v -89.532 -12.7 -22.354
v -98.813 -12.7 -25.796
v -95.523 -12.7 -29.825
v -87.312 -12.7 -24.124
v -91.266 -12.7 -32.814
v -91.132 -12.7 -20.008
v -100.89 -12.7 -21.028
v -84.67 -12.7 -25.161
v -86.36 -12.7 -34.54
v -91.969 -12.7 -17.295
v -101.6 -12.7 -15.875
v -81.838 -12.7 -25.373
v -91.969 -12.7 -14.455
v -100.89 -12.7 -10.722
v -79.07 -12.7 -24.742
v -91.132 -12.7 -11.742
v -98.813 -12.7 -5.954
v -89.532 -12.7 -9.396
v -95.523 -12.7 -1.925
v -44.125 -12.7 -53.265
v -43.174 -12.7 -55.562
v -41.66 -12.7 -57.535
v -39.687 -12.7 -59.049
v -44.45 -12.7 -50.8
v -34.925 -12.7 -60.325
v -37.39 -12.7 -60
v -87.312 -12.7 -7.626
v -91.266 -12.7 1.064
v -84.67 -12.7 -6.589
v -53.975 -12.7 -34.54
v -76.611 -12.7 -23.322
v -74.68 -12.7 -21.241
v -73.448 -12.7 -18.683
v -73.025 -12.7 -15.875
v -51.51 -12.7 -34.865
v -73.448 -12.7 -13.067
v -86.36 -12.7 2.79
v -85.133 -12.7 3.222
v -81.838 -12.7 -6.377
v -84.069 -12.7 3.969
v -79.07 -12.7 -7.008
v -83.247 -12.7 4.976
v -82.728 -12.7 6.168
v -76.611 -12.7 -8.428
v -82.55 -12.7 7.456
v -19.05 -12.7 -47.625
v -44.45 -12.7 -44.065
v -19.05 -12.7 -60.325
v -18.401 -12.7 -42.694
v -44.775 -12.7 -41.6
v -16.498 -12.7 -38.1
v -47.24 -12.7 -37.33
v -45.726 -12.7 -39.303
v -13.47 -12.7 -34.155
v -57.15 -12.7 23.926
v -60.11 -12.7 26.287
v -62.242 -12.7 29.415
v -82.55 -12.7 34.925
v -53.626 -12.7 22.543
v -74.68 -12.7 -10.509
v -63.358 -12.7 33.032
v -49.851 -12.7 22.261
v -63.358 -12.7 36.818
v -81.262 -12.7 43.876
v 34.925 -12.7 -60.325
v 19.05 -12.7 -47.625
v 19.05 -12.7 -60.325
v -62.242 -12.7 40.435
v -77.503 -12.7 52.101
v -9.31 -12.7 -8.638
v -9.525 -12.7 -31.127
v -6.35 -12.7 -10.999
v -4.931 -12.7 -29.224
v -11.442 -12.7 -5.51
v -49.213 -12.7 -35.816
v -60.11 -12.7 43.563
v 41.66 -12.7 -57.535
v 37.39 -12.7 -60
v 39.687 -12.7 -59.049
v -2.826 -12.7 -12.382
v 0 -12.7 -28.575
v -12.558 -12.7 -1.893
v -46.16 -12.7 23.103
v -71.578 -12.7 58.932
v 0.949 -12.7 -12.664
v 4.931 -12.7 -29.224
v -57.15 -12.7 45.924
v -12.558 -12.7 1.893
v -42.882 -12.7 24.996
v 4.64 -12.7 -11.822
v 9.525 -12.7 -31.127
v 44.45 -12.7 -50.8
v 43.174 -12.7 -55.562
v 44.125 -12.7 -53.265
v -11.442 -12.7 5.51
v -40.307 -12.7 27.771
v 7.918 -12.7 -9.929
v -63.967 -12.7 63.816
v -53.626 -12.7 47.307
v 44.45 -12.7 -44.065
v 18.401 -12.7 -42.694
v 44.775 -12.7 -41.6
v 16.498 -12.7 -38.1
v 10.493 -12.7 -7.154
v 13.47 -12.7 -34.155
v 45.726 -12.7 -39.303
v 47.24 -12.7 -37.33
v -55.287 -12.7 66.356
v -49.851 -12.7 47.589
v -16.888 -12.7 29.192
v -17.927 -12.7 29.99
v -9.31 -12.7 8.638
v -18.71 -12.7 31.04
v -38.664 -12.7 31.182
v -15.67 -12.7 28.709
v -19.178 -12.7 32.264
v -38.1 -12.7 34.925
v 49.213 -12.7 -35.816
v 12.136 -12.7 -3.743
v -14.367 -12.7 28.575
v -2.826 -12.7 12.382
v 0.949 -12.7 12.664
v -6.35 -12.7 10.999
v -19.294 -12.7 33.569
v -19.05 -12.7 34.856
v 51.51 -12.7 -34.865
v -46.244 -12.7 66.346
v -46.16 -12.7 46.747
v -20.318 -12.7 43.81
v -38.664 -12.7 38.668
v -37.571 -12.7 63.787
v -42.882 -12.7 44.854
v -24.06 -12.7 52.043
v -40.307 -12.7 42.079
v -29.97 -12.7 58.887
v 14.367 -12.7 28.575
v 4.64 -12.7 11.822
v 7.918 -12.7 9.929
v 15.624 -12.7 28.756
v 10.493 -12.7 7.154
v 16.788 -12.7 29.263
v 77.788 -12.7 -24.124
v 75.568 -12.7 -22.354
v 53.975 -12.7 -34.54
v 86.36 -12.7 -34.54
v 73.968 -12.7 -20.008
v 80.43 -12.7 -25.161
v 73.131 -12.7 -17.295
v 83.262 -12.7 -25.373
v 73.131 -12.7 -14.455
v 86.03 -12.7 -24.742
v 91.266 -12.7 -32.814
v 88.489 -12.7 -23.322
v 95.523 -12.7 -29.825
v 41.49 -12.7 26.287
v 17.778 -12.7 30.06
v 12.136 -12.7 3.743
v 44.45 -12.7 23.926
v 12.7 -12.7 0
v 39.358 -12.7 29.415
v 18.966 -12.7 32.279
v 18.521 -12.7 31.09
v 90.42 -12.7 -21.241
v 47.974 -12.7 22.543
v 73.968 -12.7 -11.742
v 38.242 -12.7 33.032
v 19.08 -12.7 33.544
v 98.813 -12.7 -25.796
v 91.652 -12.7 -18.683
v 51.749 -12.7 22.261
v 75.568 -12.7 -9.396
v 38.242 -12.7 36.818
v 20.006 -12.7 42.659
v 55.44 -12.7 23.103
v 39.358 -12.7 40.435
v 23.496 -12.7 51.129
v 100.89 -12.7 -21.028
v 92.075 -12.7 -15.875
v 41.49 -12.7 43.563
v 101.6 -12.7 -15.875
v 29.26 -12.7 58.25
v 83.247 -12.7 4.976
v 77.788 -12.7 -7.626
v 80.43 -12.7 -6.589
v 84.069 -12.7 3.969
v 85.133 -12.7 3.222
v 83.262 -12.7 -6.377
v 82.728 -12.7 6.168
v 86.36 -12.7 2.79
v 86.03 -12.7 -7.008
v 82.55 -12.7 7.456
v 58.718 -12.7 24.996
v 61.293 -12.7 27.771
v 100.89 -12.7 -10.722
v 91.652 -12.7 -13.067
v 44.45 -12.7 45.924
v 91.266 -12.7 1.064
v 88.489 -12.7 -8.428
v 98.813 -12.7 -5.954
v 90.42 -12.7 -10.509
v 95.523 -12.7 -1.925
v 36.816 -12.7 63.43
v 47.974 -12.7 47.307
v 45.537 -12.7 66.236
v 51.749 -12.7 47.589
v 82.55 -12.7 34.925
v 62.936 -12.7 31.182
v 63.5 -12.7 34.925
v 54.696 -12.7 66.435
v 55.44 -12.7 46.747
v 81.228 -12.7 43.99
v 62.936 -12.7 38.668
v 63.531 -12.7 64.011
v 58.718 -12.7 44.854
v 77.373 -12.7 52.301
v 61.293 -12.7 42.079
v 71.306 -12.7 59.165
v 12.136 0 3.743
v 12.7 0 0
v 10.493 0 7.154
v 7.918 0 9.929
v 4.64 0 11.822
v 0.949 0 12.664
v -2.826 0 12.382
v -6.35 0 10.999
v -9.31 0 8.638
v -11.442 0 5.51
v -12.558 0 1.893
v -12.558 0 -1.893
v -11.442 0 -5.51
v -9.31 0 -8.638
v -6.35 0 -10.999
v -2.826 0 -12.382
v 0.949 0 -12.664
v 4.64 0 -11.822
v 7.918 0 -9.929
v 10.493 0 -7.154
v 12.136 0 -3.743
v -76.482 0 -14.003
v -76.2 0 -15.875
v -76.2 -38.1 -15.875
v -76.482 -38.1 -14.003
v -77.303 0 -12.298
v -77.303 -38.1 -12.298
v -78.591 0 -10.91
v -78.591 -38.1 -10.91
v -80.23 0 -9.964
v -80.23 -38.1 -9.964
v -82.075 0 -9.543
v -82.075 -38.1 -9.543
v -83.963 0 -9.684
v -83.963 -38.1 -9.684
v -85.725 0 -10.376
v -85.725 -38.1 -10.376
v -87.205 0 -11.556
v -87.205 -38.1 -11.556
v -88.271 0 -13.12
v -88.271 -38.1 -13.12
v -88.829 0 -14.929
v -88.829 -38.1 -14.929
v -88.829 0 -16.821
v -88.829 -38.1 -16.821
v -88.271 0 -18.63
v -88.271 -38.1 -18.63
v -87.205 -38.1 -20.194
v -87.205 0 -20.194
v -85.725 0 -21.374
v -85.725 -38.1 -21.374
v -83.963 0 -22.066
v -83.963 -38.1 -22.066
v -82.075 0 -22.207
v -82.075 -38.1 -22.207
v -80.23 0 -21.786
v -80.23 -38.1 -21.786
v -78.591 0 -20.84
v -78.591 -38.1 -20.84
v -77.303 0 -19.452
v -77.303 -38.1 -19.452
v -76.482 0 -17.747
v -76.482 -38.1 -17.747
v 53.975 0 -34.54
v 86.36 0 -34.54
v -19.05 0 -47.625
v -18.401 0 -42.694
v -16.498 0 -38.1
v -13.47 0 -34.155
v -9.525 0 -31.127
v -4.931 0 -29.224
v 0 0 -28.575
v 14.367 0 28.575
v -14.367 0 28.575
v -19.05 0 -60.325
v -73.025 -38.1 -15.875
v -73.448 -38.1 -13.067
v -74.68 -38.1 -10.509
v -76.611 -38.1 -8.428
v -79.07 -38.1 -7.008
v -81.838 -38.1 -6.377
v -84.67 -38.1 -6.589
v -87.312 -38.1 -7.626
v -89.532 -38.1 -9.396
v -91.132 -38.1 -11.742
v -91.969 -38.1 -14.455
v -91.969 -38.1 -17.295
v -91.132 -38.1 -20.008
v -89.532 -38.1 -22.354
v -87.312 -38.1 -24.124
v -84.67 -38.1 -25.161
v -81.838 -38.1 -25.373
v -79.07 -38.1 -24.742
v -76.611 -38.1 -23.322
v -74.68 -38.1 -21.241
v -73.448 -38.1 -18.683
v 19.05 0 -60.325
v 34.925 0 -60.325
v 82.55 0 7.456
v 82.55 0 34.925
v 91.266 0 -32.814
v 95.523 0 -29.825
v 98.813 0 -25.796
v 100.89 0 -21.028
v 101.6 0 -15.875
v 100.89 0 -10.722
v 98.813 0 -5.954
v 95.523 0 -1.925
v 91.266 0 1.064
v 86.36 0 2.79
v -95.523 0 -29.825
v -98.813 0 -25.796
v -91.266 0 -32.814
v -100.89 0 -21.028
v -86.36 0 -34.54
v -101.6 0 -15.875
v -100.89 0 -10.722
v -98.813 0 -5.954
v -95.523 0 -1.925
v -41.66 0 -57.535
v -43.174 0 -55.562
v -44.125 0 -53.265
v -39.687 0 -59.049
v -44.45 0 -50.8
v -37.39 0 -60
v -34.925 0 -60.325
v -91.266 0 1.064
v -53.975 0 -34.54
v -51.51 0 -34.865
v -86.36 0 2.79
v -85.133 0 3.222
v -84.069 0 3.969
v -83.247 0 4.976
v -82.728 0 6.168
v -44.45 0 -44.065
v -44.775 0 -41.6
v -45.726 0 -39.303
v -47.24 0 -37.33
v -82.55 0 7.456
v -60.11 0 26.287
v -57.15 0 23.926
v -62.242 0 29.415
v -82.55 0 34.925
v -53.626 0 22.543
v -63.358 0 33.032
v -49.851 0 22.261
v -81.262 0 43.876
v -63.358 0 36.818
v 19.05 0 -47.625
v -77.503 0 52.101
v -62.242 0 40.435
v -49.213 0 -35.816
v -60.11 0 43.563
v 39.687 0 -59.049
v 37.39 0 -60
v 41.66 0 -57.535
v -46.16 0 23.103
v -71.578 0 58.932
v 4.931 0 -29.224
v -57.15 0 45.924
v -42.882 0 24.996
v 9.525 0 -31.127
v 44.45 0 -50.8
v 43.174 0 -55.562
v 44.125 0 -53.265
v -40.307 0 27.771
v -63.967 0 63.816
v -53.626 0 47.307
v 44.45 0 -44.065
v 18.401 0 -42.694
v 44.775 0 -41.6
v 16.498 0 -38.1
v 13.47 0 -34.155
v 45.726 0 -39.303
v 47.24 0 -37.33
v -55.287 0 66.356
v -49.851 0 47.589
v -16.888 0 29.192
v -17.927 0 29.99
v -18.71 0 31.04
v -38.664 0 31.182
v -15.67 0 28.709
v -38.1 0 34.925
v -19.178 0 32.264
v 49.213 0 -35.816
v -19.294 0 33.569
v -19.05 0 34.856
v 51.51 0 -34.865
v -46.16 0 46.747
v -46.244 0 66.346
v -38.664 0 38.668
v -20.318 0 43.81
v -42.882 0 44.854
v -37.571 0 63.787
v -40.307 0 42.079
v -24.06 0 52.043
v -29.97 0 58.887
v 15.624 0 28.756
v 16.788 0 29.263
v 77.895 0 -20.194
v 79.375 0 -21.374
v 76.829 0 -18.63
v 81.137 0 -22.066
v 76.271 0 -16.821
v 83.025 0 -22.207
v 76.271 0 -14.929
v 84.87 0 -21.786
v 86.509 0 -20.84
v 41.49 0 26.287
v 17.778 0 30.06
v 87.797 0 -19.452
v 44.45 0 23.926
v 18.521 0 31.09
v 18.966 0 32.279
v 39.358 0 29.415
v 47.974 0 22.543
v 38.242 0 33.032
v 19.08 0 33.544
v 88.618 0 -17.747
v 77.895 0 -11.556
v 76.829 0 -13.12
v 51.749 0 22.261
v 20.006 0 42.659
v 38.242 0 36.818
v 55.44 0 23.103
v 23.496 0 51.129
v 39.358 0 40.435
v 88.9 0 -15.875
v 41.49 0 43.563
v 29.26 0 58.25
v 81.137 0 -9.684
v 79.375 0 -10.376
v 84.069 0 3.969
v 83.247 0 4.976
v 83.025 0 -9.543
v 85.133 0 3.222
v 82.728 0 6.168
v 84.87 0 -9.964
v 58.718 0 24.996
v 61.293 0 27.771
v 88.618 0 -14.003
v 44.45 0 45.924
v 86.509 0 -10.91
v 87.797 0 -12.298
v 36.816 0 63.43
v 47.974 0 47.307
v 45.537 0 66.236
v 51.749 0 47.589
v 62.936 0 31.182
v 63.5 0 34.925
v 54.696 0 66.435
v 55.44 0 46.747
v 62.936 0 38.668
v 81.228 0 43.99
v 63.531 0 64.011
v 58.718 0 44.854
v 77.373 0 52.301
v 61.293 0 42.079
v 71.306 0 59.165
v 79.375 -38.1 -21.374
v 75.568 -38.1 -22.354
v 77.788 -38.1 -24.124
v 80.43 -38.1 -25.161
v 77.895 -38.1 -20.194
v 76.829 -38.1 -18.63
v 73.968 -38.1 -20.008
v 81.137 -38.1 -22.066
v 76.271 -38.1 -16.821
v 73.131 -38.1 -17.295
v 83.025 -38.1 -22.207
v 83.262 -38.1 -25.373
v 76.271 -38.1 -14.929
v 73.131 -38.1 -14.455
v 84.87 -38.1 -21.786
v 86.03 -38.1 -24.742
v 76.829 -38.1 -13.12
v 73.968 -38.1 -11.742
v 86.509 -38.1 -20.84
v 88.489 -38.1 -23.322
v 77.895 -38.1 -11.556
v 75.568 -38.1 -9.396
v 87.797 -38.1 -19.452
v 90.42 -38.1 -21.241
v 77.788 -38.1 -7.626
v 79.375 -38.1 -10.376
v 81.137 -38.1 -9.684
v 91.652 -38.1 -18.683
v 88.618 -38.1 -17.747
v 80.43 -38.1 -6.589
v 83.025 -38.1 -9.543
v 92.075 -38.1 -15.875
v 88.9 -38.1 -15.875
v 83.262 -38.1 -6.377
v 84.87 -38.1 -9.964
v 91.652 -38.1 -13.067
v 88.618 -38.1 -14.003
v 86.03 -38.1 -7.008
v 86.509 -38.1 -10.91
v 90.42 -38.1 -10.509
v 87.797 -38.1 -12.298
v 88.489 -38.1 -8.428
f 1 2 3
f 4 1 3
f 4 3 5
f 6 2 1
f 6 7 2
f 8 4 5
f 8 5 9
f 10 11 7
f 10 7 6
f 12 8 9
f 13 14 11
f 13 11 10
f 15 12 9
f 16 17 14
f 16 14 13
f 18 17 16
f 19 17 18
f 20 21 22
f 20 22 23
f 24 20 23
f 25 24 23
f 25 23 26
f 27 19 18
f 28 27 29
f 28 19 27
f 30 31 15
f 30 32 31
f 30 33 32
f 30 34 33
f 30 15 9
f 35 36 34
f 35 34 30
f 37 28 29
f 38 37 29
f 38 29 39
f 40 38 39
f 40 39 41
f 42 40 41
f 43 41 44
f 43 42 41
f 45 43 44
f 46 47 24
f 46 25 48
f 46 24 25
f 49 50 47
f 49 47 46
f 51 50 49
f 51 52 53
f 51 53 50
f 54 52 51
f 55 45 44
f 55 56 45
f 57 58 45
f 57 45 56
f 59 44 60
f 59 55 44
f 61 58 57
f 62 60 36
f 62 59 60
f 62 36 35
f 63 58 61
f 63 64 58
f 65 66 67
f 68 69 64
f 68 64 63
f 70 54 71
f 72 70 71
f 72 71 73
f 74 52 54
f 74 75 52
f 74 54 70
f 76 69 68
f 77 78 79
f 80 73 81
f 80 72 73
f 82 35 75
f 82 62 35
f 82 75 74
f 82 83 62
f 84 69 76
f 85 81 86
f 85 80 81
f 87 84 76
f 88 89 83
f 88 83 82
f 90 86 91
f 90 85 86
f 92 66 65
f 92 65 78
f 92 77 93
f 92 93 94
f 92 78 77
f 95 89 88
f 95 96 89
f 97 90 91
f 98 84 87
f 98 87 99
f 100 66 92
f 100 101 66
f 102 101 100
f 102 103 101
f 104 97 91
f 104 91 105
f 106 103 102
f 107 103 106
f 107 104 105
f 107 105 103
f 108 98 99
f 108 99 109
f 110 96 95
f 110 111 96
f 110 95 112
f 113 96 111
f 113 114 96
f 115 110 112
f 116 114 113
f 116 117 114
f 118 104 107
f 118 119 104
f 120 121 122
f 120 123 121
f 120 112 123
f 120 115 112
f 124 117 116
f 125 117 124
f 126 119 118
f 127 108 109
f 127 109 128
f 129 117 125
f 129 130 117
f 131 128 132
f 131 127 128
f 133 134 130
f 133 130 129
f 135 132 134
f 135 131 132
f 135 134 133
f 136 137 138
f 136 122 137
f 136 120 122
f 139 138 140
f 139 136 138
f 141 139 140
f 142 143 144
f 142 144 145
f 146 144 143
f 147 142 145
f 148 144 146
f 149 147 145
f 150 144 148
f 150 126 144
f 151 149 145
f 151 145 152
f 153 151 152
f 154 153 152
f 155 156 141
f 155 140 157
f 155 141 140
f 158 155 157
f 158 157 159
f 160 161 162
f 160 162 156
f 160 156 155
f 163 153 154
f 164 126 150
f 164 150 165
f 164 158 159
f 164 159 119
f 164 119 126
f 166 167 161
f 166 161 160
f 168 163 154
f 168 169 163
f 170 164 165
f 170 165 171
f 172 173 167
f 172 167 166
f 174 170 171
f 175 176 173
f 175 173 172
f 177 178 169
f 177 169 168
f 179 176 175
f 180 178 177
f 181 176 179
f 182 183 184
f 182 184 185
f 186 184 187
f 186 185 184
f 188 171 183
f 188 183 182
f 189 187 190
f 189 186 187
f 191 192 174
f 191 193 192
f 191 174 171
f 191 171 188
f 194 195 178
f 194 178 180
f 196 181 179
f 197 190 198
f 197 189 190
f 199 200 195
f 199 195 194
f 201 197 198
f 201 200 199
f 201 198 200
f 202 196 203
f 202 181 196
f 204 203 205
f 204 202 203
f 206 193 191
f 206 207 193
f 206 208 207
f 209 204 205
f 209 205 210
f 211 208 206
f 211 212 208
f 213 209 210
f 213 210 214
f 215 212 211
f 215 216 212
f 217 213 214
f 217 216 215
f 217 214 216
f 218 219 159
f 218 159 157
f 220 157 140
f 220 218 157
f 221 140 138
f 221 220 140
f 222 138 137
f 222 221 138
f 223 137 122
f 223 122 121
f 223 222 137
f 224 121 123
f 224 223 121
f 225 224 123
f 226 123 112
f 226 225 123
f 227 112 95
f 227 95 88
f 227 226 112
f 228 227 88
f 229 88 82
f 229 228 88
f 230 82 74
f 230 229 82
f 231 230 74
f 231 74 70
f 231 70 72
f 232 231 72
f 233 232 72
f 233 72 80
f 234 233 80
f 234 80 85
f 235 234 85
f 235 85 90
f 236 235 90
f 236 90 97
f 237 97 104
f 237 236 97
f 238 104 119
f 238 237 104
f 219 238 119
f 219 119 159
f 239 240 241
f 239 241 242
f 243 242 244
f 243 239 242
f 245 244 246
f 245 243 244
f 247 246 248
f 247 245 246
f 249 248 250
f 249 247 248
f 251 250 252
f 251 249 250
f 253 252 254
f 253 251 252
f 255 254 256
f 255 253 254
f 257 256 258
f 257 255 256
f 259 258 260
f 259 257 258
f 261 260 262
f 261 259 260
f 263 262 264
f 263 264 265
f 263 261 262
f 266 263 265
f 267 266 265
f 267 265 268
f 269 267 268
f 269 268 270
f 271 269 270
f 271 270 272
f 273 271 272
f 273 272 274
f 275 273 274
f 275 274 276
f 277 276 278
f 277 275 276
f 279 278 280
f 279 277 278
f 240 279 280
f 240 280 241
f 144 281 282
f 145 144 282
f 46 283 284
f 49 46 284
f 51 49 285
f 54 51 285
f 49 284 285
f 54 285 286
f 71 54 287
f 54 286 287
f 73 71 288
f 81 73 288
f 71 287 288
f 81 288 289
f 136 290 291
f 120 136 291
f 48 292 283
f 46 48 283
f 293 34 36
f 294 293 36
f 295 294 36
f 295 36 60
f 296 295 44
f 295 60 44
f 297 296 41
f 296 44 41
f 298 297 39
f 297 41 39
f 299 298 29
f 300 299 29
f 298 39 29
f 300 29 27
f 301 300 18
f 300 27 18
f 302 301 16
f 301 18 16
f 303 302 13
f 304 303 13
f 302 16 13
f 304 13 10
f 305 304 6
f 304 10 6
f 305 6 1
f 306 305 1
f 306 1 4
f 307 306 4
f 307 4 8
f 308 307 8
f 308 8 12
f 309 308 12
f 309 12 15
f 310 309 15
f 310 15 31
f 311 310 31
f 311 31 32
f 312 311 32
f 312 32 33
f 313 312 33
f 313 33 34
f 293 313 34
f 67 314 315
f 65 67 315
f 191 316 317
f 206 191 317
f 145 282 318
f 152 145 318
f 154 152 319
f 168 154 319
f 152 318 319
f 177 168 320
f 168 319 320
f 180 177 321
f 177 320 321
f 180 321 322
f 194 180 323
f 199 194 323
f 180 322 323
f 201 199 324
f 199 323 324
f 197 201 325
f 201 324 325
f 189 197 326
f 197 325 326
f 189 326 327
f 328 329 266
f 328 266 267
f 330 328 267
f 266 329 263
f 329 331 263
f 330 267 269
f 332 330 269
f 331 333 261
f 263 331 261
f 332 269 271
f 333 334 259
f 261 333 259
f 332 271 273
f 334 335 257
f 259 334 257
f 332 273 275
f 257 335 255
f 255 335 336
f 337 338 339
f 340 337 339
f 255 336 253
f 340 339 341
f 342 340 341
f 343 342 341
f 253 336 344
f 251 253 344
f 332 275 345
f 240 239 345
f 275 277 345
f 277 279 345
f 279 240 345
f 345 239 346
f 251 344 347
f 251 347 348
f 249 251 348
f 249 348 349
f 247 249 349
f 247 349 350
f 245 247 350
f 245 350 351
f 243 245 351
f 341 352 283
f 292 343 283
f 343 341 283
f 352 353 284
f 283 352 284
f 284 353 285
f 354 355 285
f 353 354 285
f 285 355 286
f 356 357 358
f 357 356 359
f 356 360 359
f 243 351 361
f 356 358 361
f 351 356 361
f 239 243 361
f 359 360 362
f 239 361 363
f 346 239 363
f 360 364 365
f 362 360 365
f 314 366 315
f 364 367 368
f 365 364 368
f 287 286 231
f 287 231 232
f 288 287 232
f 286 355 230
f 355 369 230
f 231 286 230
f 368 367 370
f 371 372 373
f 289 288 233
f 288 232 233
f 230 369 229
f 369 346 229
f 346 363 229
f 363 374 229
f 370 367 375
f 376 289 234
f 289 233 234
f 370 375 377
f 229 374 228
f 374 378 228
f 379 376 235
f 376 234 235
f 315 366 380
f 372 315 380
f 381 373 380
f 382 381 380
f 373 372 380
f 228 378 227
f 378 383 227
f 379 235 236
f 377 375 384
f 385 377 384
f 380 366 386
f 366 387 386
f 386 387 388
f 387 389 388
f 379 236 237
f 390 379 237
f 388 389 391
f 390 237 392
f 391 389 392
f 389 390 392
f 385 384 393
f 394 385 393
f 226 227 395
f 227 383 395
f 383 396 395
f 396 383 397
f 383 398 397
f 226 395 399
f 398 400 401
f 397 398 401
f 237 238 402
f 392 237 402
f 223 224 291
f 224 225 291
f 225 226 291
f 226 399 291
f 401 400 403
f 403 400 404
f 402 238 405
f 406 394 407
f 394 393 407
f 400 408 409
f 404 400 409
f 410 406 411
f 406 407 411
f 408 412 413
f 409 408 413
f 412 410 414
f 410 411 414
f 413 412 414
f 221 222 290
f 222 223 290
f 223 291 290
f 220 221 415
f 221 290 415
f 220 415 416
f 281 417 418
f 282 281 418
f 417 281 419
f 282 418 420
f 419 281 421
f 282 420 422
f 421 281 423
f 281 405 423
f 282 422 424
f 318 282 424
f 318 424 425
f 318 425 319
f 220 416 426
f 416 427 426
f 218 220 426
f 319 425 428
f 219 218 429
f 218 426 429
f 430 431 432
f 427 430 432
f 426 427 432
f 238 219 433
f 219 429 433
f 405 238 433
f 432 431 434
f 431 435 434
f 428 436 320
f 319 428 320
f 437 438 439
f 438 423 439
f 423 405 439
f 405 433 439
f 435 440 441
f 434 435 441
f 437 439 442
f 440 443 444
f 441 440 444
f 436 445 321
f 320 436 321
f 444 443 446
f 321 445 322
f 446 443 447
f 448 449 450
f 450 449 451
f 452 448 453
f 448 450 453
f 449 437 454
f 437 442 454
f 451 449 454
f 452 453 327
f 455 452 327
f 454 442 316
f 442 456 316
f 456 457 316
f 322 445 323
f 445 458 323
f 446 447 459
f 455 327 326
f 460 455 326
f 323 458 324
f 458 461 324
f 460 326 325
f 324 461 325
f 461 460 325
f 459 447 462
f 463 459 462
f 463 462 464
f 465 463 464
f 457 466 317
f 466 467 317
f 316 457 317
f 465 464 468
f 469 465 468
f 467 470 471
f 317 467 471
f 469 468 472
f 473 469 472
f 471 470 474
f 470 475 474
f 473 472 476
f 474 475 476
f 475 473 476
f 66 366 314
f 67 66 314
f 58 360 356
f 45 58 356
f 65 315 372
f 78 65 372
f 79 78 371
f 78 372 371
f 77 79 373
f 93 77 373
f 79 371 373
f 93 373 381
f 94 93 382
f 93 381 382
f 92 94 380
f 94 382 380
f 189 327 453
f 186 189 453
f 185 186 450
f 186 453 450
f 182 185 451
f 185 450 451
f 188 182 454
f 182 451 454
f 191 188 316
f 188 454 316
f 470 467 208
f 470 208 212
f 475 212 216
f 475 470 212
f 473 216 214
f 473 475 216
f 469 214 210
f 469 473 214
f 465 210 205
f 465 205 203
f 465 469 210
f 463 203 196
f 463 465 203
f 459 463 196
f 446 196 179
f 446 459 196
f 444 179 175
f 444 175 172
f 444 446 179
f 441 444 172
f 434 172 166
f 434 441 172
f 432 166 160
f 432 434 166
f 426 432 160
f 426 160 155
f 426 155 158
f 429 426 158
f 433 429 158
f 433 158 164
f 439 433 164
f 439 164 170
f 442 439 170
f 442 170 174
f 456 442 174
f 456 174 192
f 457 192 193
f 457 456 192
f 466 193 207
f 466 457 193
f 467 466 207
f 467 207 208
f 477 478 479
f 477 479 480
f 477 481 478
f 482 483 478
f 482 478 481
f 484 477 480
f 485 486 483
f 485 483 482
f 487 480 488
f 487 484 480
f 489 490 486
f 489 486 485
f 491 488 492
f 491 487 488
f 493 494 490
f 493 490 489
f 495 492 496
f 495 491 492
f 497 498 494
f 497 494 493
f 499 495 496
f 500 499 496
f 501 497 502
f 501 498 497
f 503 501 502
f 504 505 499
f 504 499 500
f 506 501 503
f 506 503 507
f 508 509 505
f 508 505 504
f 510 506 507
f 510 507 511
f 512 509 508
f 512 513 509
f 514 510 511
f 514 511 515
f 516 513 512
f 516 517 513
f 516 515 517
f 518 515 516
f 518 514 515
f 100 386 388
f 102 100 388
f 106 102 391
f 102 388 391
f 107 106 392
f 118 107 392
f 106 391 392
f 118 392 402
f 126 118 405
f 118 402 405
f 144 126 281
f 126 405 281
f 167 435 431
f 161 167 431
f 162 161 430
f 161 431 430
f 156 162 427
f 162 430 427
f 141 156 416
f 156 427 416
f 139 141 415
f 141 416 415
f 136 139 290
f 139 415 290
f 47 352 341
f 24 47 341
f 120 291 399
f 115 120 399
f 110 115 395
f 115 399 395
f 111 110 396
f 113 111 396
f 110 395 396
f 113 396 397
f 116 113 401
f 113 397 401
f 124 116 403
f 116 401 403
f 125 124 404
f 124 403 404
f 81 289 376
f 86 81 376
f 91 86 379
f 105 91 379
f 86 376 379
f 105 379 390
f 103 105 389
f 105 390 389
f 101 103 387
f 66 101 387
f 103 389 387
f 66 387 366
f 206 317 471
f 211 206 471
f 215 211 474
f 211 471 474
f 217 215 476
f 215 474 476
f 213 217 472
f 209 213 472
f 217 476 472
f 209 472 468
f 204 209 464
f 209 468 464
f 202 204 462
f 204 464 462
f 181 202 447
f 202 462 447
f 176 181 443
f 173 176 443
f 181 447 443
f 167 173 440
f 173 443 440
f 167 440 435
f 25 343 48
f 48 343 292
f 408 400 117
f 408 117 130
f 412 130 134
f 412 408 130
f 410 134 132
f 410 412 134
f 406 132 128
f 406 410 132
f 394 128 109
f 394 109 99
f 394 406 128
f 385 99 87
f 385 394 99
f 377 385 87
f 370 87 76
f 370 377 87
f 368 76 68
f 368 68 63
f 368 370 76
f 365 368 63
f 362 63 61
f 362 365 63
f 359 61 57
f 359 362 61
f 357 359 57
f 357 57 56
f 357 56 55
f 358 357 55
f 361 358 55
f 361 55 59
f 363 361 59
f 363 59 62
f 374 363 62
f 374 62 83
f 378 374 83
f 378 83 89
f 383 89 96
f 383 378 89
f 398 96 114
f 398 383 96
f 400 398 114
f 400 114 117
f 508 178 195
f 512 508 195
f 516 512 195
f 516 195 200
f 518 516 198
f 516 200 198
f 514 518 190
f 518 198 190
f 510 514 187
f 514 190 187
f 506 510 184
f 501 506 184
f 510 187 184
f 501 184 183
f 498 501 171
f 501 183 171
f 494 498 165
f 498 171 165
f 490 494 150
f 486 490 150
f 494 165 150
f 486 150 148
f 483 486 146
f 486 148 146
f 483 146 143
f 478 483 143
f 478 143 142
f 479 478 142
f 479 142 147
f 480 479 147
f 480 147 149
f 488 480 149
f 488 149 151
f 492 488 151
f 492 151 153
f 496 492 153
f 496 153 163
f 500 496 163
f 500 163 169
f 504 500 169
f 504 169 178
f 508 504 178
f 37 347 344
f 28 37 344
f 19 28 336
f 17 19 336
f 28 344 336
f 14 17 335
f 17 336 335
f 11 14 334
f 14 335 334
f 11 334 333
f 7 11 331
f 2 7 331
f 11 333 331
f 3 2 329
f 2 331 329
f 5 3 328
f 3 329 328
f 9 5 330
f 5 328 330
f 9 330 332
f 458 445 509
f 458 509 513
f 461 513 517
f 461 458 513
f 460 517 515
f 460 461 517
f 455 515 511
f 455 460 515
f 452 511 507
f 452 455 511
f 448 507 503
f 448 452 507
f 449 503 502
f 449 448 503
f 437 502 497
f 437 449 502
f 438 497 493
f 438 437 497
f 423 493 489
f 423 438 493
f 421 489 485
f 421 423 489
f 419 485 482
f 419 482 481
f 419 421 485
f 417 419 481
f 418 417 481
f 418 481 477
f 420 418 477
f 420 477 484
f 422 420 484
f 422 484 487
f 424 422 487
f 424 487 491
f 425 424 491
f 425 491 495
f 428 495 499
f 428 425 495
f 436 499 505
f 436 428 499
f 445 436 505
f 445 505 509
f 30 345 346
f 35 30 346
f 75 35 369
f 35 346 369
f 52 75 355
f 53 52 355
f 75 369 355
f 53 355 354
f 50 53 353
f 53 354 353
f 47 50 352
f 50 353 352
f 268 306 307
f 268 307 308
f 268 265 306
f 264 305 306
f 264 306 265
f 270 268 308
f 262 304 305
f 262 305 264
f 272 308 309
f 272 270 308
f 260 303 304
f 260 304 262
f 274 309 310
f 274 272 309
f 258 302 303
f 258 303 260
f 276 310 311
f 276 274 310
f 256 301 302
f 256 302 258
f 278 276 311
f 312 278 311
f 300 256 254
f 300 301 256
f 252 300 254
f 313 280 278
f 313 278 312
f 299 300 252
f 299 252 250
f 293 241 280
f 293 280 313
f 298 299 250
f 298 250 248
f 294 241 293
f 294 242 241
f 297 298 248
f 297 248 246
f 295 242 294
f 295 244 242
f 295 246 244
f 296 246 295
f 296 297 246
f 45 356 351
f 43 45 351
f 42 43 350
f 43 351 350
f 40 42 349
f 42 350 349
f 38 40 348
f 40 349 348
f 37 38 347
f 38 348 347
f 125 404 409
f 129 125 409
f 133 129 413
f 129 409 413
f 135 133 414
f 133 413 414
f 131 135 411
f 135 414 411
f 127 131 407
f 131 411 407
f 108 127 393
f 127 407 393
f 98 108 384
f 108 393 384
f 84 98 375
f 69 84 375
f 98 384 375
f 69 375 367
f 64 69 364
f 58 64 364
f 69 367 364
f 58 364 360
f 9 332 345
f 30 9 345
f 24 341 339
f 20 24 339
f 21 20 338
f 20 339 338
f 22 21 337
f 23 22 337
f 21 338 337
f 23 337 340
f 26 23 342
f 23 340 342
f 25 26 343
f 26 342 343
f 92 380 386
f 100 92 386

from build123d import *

# Parameters (mm, degrees)
F0_R     = 9.525
F0_R_2   = 12.7
F1_DEPTH = 12.7
F0_R_3   = 6.35
F2_DEPTH = 38.1


with BuildPart() as f1:
    # F0 (on Front) → F1 (new body)
    with BuildSketch(Plane.XZ):
        with BuildLine():
            ThreePointArc((19.0800315969, 33.5443825636), (17.7775003101, 30.0599167658), (14.3667655142, 28.575))
            Line((14.3667655142, 28.575), (-14.3667655142, 28.575))
            ThreePointArc((-14.3667655142, 28.575), (-18.3550358696, 30.4875726696), (-19.0500754755, 34.8557707639))
            ThreePointArc((-19.0500754755, 34.8557707639), (-50.7653853614, 66.6749811311), (-82.55, 34.925))
            Line((-82.55, 34.925), (-82.55, 7.4563898))
            ThreePointArc((-82.55, 7.4563898), (-83.6234833627, 4.4443203287), (-86.36, 2.79011184))
            ThreePointArc((-86.36, 2.79011184), (-101.6, -15.875), (-86.36, -34.54011184))
            Line((-86.36, -34.54011184), (-53.975, -34.54011184))
            ThreePointArc((-53.975, -34.54011184), (-47.2398079092, -37.3299197492), (-44.45, -44.06511184))
            Line((-44.45, -44.06511184), (-44.45, -50.8))
            ThreePointArc((-44.45, -50.8), (-41.6601920908, -57.5351920908), (-34.925, -60.325))
            Line((-34.925, -60.325), (-19.05, -60.325))
            Line((-19.05, -60.325), (-19.05, -47.625))
            ThreePointArc((-19.05, -47.625), (-13.4703841816, -34.1546158184), (0, -28.575))
            ThreePointArc((0, -28.575), (13.4703841816, -34.1546158184), (19.05, -47.625))
            Line((19.05, -47.625), (19.05, -60.325))
            Line((19.05, -60.325), (34.925, -60.325))
            ThreePointArc((34.925, -60.325), (41.6601920908, -57.5351920908), (44.45, -50.8))
            Line((44.45, -50.8), (44.45, -44.06511184))
            ThreePointArc((44.45, -44.06511184), (47.2398079092, -37.3299197492), (53.975, -34.54011184))
            Line((53.975, -34.54011184), (86.36, -34.54011184))
            ThreePointArc((86.36, -34.54011184), (101.6, -15.875), (86.36, 2.79011184))
            ThreePointArc((86.36, 2.79011184), (83.6234833627, 4.4443203287), (82.55, 7.4563898))
            Line((82.55, 7.4563898), (82.55, 34.925))
            ThreePointArc((82.55, 34.925), (50.1095279871, 66.6674912129), (19.0800315969, 33.5443825636))
        make_face()
        with Locations((-82.55, -15.875)):
            Circle(F0_R, mode=Mode.SUBTRACT)
        Circle(F0_R_2, mode=Mode.SUBTRACT)
        with Locations((82.55, -15.875)):
            Circle(F0_R, mode=Mode.SUBTRACT)
        with Locations((-50.8, 34.925)):
            Circle(F0_R_2, mode=Mode.SUBTRACT)
        with Locations((50.8, 34.925)):
            Circle(F0_R_2, mode=Mode.SUBTRACT)
    extrude(amount=F1_DEPTH)

    # F0 (on Front) → F2 (join)
    with BuildSketch(Plane.XZ):
        with Locations((-82.55, -15.875)):
            Circle(F0_R)
        with Locations((-82.55, -15.875)):
            Circle(F0_R_3, mode=Mode.SUBTRACT)
        with Locations((82.55, -15.875)):
            Circle(F0_R)
        with Locations((82.55, -15.875)):
            Circle(F0_R_3, mode=Mode.SUBTRACT)
    extrude(amount=F2_DEPTH)


solid = f1.part
